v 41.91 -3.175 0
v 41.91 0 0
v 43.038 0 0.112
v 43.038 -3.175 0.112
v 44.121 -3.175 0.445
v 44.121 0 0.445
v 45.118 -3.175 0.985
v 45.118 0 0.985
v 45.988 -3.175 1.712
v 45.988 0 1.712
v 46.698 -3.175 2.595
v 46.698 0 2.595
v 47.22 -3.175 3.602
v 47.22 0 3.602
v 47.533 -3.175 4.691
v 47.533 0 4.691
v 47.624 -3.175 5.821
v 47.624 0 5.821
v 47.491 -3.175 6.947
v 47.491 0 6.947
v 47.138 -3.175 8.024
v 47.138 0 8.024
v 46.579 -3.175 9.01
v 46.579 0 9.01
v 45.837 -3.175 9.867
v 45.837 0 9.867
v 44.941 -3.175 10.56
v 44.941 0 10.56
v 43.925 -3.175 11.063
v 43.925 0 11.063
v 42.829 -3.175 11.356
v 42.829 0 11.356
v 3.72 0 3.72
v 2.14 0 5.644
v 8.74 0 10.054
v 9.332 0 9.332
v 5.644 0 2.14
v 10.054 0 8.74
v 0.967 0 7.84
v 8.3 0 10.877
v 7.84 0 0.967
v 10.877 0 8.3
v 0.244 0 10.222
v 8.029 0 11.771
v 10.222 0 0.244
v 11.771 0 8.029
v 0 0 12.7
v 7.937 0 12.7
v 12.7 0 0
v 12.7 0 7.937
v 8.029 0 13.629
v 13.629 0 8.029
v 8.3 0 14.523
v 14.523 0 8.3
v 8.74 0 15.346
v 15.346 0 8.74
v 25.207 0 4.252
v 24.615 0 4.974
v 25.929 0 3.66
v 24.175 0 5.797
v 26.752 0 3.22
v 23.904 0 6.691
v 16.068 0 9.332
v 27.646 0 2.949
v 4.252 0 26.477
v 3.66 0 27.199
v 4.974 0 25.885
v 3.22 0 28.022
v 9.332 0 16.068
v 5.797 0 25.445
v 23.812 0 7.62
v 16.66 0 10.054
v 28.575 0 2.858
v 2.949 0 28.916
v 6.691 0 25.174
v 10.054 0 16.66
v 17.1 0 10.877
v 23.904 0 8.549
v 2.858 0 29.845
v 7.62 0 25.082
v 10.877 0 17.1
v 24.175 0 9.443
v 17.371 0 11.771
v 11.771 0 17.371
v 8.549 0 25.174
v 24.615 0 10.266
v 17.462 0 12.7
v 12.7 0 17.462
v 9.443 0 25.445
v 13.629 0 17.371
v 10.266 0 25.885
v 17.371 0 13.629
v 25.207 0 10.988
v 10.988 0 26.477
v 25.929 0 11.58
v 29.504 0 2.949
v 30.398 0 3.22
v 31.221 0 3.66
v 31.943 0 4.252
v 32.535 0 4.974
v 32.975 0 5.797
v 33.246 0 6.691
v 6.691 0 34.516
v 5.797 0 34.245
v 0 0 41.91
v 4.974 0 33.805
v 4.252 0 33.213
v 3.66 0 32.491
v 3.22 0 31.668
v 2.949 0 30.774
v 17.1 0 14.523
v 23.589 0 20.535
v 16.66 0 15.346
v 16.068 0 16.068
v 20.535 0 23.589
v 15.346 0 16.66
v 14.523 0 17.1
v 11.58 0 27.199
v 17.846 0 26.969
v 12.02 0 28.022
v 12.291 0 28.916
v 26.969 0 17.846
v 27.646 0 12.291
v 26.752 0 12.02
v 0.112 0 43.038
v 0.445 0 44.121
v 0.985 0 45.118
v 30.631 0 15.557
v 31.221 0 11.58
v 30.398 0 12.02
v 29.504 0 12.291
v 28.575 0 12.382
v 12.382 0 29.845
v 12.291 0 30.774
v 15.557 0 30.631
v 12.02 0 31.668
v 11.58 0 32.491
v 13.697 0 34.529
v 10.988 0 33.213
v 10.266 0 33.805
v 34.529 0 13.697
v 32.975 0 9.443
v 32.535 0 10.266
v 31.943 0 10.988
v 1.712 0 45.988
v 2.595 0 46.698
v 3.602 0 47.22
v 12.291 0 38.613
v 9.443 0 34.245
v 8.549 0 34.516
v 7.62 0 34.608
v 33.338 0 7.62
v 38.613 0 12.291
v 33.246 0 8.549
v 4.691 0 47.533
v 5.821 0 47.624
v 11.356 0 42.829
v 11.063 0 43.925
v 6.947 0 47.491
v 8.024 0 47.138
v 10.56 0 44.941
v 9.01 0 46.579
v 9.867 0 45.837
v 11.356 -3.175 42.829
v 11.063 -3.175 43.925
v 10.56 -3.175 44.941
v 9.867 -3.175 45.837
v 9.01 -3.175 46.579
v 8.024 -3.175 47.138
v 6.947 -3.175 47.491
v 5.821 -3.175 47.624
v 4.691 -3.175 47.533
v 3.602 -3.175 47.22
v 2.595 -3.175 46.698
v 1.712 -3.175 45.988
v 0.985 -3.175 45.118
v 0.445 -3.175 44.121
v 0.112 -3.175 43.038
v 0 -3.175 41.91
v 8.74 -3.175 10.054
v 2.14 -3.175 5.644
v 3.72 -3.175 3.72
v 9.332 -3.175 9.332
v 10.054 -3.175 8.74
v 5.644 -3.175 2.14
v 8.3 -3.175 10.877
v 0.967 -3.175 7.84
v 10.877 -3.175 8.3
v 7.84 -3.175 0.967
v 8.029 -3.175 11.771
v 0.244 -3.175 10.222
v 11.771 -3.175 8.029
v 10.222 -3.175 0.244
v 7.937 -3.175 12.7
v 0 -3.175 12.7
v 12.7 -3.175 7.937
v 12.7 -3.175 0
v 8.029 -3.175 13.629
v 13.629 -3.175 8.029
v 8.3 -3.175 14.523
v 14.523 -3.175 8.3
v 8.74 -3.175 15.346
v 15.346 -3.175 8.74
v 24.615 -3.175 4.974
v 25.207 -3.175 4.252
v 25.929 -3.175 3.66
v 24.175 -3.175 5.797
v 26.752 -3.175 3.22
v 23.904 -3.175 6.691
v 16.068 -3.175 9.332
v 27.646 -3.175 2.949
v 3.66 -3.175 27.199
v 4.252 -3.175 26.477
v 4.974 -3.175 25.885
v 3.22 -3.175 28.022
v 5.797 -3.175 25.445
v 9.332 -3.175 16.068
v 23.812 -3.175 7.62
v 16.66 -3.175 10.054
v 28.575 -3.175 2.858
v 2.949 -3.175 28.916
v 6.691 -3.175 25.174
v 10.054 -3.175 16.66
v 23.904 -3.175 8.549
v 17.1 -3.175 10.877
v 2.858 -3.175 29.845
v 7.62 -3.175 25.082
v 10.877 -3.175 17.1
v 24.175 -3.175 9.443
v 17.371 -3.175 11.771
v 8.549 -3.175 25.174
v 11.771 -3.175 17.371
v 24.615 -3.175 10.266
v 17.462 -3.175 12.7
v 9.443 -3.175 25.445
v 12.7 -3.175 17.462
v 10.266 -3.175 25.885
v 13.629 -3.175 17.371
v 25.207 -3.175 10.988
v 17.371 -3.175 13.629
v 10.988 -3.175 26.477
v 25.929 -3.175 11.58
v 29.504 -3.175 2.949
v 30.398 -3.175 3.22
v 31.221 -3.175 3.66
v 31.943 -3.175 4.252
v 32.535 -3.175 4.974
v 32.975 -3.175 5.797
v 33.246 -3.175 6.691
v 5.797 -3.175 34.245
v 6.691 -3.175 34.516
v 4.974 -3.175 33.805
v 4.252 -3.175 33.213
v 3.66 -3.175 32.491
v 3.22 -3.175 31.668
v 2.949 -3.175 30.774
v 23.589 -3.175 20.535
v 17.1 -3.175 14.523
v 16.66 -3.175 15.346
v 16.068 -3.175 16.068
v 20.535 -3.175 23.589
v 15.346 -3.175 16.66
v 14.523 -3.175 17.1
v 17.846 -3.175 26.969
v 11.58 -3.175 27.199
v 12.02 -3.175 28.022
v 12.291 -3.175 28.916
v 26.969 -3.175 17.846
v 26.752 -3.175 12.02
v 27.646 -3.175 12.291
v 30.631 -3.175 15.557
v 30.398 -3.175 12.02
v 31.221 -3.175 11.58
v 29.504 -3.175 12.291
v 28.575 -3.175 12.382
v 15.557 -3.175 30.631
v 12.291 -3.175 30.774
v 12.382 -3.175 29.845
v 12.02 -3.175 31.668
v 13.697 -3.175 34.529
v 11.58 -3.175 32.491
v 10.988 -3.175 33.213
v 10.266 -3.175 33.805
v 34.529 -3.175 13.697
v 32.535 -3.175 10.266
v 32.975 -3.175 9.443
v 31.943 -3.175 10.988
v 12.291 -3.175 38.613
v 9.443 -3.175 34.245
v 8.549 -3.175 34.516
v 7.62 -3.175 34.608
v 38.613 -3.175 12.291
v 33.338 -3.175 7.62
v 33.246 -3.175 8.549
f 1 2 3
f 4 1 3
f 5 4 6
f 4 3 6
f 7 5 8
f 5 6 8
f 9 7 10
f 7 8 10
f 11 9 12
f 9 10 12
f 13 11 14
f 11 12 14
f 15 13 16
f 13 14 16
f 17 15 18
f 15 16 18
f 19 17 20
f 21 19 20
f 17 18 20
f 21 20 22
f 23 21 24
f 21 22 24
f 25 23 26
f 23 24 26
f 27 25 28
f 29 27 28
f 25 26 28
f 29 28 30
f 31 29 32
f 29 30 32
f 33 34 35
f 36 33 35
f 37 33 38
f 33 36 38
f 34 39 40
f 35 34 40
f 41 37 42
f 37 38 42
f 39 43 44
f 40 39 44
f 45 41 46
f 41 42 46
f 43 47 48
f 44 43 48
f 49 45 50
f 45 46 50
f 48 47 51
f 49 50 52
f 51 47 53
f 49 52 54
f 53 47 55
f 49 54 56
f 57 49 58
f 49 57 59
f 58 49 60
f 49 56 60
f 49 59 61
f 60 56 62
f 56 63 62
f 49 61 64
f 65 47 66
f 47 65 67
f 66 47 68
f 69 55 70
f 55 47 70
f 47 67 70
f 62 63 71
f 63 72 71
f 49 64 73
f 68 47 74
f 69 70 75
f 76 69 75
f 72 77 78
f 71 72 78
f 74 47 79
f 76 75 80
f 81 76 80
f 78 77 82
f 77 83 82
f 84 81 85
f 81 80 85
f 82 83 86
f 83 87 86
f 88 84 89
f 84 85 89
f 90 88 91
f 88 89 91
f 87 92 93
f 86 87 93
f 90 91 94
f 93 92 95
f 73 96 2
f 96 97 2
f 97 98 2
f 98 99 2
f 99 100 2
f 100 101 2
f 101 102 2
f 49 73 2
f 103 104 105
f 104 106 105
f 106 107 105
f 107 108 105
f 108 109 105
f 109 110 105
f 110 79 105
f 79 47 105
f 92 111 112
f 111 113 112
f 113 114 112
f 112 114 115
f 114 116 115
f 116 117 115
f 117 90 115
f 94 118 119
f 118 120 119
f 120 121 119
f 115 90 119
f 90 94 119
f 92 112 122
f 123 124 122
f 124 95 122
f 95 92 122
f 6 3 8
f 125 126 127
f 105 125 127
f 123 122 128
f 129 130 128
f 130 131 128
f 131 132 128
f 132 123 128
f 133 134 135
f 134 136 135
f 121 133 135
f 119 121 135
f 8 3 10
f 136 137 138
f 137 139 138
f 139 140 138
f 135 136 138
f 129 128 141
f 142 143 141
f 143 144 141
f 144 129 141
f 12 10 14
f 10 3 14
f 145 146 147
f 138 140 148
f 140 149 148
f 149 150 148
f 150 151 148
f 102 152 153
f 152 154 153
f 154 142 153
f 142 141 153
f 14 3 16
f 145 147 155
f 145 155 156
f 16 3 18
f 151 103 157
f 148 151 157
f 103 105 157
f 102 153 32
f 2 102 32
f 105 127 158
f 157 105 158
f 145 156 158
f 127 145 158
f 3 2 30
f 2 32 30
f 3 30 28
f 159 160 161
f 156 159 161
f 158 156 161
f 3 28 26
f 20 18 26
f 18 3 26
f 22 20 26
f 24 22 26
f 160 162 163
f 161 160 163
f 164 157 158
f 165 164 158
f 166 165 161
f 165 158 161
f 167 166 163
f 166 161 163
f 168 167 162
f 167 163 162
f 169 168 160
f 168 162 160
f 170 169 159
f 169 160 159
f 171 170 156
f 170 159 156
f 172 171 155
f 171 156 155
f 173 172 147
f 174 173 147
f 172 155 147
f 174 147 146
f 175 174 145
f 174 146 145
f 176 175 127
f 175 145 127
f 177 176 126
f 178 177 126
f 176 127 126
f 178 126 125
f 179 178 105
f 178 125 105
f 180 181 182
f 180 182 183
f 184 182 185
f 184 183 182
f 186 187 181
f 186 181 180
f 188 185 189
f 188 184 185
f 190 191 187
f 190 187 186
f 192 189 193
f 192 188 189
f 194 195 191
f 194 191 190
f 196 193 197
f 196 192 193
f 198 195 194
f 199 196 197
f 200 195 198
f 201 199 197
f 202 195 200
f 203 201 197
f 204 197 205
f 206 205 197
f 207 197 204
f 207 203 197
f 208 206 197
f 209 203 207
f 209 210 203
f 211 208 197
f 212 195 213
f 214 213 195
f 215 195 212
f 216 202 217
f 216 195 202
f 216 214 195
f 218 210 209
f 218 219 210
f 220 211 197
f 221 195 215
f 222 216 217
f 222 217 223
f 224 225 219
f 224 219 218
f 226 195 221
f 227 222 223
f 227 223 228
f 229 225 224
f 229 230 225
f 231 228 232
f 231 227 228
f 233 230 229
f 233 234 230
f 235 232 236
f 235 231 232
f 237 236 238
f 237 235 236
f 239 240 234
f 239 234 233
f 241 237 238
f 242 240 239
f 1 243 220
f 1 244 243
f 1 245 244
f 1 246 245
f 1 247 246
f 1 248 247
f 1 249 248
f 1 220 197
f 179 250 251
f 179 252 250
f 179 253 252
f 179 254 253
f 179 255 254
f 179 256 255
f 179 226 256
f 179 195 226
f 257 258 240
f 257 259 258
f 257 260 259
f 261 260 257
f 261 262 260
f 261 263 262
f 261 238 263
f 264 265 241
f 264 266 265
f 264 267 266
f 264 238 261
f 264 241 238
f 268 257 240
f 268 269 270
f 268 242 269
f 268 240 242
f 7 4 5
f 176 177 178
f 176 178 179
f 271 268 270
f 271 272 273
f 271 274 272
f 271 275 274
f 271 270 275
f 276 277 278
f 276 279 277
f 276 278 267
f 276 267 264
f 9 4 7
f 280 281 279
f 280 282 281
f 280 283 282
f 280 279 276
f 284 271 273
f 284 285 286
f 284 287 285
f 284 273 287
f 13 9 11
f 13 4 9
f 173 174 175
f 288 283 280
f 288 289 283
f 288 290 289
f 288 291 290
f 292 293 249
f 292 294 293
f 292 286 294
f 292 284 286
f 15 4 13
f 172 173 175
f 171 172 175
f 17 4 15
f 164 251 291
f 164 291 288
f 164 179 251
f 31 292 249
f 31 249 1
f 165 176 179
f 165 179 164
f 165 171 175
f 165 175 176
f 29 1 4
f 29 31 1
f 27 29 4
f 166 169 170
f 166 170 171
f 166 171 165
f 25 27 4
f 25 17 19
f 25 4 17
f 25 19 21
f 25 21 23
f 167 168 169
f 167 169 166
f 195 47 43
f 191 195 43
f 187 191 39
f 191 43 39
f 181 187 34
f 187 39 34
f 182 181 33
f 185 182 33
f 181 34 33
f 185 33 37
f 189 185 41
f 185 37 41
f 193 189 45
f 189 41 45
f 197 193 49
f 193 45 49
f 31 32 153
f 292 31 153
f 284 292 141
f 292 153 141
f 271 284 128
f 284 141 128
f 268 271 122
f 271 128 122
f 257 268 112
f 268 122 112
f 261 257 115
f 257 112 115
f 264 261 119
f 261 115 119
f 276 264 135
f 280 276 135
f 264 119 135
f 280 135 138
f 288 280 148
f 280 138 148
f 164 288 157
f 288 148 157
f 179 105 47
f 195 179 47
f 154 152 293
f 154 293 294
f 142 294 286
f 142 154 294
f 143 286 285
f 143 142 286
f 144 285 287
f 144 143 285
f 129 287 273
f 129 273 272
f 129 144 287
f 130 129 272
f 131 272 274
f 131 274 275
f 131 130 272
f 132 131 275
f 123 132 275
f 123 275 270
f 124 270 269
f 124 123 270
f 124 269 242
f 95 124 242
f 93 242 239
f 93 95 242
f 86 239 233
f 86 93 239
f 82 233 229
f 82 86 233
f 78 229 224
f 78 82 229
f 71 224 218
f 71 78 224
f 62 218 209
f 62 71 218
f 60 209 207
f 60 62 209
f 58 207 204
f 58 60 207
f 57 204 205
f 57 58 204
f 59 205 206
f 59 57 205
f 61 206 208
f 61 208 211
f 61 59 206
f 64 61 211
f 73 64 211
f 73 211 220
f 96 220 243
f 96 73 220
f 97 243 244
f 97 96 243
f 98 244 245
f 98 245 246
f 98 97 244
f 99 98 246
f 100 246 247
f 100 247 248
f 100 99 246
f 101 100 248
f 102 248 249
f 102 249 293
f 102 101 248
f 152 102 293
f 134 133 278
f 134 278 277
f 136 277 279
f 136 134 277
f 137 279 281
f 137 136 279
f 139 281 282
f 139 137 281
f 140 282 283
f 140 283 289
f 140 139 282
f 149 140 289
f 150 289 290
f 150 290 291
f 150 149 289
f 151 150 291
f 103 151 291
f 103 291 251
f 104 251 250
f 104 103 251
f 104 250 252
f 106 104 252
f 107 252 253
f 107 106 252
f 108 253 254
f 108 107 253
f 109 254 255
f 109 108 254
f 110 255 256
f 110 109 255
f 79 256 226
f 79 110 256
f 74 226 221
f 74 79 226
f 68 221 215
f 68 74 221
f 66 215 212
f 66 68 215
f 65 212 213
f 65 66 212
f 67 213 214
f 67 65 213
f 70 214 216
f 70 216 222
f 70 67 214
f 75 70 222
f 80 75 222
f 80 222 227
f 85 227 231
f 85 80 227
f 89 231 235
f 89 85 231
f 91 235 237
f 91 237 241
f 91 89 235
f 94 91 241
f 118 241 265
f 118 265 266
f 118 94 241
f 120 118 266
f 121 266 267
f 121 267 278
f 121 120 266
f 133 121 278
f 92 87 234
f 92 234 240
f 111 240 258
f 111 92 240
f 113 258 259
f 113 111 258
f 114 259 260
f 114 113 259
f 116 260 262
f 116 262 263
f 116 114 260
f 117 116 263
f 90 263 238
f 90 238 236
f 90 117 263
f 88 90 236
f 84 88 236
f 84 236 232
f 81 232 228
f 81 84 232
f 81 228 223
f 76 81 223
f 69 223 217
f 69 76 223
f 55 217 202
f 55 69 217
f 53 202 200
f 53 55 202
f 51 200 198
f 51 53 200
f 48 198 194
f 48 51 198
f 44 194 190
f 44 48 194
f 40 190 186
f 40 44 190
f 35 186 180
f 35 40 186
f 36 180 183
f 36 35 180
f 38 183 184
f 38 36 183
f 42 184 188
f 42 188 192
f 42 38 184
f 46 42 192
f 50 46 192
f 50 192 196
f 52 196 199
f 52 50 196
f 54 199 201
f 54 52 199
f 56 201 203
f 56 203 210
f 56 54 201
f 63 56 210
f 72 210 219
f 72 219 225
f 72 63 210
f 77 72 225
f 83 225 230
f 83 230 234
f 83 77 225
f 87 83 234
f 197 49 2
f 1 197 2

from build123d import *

# Parameters (mm, degrees)
F0_R     = 4.7625
F1_DEPTH = 3.175


with BuildPart() as f1:
    # F0 (on Front) → F1 (new body)
    with BuildSketch(Plane.XZ):
        with BuildLine():
            ThreePointArc((42.829464, 11.355551), (22.018453, 22.018453), (11.355551, 42.829464))
            ThreePointArc((11.355551, 42.829464), (5.253764, 47.606357), (0, 41.91))
            Line((0, 41.91), (0, 12.7))
            ThreePointArc((0, 12.7), (3.719744, 3.719744), (12.7, 0))
            Line((12.7, 0), (41.91, 0))
            ThreePointArc((41.91, 0), (47.606357, 5.253764), (42.829464, 11.355551))
        make_face()
        with Locations((12.7, 12.7)):
            Circle(F0_R, mode=Mode.SUBTRACT)
        with Locations((28.575, 7.62)):
            Circle(F0_R, mode=Mode.SUBTRACT)
        with Locations((7.62, 29.845)):
            Circle(F0_R, mode=Mode.SUBTRACT)
    extrude(amount=F1_DEPTH)


solid = f1.part
